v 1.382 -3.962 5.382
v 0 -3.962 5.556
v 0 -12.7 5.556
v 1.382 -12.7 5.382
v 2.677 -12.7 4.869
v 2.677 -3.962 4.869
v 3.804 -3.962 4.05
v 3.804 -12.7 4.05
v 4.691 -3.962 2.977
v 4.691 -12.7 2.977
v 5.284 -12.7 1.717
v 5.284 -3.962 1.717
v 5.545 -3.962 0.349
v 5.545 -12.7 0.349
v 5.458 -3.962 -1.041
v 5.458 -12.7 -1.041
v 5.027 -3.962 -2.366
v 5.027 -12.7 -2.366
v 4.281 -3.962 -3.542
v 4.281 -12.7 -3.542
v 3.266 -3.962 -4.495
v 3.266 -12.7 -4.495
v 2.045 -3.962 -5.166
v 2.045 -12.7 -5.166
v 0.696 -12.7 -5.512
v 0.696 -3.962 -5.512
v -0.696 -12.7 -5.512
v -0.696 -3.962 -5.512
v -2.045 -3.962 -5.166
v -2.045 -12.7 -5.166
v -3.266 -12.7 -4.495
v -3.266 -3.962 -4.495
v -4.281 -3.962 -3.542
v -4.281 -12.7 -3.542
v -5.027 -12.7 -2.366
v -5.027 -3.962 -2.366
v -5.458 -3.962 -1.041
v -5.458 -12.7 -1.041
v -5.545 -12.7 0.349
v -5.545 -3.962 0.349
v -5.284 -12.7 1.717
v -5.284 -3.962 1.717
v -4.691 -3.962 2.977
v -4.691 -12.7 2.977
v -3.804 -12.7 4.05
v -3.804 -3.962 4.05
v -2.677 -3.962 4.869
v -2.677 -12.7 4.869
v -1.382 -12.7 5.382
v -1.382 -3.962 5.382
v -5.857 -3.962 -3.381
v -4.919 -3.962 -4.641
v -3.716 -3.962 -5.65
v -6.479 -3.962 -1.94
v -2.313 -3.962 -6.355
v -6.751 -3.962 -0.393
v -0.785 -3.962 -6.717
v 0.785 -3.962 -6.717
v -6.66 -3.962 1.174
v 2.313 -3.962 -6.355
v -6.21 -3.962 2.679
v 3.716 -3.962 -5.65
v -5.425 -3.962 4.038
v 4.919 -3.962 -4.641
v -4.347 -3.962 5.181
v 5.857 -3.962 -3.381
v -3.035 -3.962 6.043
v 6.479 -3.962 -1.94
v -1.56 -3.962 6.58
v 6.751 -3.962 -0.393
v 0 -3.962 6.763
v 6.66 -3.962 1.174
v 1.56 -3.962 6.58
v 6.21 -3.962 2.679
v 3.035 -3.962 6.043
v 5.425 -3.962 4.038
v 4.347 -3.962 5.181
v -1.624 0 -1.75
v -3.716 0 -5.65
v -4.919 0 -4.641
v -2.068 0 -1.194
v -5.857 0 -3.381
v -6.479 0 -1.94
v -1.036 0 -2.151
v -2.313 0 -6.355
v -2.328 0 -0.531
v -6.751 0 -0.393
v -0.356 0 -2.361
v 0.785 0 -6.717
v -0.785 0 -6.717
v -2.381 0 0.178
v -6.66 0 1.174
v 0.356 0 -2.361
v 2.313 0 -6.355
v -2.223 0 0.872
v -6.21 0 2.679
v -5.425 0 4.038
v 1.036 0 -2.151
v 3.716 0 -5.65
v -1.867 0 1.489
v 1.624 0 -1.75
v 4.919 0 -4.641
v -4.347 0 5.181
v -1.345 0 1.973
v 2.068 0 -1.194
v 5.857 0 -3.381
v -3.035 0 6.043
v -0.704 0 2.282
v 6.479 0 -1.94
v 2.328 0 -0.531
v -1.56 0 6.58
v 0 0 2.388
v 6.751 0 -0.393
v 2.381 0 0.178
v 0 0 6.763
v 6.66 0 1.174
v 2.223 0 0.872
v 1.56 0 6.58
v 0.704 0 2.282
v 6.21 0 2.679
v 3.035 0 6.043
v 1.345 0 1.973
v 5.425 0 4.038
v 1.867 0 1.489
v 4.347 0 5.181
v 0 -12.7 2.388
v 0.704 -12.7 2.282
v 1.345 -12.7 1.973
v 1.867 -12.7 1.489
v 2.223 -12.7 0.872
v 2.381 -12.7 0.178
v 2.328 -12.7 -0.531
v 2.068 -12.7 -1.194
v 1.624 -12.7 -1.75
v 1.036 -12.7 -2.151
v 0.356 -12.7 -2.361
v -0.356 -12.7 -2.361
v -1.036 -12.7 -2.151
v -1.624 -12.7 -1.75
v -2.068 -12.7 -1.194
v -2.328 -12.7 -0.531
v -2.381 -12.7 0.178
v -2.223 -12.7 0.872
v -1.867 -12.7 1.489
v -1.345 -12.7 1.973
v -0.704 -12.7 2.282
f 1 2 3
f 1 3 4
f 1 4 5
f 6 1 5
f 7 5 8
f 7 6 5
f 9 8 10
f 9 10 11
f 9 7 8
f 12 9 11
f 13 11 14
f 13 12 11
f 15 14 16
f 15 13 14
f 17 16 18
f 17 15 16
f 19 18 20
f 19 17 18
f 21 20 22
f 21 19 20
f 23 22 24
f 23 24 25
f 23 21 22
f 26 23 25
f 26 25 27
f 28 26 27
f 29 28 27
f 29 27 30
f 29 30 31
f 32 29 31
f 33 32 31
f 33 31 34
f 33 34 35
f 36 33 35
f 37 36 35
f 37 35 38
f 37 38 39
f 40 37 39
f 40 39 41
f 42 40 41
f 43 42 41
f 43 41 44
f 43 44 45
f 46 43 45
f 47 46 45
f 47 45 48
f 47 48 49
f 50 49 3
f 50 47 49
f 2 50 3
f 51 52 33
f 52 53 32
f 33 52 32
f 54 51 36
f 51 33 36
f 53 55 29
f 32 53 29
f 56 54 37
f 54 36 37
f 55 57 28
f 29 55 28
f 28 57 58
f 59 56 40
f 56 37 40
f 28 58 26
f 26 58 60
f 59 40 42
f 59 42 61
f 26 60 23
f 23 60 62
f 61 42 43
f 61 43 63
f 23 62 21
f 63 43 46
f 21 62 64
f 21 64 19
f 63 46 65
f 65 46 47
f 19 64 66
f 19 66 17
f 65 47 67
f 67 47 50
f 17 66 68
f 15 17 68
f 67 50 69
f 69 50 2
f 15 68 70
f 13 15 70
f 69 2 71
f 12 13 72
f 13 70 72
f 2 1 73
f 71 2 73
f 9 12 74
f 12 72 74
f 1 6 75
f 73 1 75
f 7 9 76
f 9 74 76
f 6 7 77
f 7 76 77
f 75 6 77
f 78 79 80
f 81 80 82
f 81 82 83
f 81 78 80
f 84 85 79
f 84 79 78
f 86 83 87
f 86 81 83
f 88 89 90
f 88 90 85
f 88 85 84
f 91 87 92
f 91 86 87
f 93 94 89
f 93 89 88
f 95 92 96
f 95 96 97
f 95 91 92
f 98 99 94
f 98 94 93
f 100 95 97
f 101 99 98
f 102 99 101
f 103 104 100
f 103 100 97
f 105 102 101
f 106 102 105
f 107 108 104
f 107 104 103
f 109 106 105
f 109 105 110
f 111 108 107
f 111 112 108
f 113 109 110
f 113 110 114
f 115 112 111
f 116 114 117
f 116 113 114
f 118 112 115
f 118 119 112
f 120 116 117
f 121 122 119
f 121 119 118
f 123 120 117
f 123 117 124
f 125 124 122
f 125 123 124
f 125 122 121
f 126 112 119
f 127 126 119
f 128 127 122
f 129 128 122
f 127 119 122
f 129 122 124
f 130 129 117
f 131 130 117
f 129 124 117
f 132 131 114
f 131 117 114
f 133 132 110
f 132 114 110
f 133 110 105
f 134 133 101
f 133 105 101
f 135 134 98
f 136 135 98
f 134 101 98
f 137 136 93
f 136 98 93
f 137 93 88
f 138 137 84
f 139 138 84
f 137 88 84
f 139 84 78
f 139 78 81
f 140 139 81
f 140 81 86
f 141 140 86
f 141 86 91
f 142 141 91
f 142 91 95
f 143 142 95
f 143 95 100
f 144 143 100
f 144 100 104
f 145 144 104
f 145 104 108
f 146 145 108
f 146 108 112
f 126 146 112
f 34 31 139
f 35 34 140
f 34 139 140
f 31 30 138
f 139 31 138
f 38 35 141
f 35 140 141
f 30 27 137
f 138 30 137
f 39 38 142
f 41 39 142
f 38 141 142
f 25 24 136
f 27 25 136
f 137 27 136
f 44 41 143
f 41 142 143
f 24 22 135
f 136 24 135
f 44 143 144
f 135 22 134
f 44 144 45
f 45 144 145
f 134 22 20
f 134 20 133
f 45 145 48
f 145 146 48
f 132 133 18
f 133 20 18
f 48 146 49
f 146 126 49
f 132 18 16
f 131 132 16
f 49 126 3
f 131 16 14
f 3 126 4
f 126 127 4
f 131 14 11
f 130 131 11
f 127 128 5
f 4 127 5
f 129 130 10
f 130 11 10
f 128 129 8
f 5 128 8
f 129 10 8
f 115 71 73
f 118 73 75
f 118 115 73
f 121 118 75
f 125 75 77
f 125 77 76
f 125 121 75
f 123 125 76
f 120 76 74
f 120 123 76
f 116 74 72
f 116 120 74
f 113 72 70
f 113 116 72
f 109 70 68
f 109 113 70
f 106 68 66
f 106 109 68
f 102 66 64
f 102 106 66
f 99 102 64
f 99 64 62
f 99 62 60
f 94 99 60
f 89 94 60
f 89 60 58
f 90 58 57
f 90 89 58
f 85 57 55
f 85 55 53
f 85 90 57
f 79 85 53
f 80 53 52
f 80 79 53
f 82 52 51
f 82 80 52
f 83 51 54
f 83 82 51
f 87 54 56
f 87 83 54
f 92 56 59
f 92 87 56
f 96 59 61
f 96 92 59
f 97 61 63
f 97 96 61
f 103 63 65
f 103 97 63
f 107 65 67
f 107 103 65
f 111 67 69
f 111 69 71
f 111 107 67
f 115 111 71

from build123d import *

# Parameters (mm, degrees)
SKETCH1_R           = 5.55625
BASE_EXTRUDE_DEPTH  = 12.7
SKETCH2_R           = 6.76275
BOSS_EXTRUDE1_DEPTH = 3.9624
SKETCH3_R           = 2.3876
CUT_EXTRUDE1_DEPTH  = 16.898414233


with BuildPart() as part:
    # Sketch1 → Base-Extrude (new body)
    with BuildSketch(Plane(origin=(0, 0, 0), x_dir=(1, 0, 0), z_dir=(0, 1, 0))):
        with Locations(Location((0, 0, 0), (0, 0, 270))):
            Circle(SKETCH1_R)
    extrude(amount=-BASE_EXTRUDE_DEPTH)

    # Sketch2 → Boss-Extrude1 (add)
    with BuildSketch(Plane(origin=(0, 0, 0), x_dir=(-1, 0, 0), z_dir=(0, 1, 0))):
        with Locations(Location((0, 0, 0), (0, 0, 90))):
            Circle(SKETCH2_R)
    extrude(amount=-BOSS_EXTRUDE1_DEPTH)

    # Sketch3 → Cut-Extrude1 (cut, through all)
    with BuildSketch(Plane(origin=(0, 0, 0), x_dir=(-1, 0, 0), z_dir=(0, 1, 0))):
        with Locations(Location((0, 0, 0), (0, 0, 90))):
            Circle(SKETCH3_R)
    extrude(amount=-CUT_EXTRUDE1_DEPTH, mode=Mode.SUBTRACT)


solid = part.part
